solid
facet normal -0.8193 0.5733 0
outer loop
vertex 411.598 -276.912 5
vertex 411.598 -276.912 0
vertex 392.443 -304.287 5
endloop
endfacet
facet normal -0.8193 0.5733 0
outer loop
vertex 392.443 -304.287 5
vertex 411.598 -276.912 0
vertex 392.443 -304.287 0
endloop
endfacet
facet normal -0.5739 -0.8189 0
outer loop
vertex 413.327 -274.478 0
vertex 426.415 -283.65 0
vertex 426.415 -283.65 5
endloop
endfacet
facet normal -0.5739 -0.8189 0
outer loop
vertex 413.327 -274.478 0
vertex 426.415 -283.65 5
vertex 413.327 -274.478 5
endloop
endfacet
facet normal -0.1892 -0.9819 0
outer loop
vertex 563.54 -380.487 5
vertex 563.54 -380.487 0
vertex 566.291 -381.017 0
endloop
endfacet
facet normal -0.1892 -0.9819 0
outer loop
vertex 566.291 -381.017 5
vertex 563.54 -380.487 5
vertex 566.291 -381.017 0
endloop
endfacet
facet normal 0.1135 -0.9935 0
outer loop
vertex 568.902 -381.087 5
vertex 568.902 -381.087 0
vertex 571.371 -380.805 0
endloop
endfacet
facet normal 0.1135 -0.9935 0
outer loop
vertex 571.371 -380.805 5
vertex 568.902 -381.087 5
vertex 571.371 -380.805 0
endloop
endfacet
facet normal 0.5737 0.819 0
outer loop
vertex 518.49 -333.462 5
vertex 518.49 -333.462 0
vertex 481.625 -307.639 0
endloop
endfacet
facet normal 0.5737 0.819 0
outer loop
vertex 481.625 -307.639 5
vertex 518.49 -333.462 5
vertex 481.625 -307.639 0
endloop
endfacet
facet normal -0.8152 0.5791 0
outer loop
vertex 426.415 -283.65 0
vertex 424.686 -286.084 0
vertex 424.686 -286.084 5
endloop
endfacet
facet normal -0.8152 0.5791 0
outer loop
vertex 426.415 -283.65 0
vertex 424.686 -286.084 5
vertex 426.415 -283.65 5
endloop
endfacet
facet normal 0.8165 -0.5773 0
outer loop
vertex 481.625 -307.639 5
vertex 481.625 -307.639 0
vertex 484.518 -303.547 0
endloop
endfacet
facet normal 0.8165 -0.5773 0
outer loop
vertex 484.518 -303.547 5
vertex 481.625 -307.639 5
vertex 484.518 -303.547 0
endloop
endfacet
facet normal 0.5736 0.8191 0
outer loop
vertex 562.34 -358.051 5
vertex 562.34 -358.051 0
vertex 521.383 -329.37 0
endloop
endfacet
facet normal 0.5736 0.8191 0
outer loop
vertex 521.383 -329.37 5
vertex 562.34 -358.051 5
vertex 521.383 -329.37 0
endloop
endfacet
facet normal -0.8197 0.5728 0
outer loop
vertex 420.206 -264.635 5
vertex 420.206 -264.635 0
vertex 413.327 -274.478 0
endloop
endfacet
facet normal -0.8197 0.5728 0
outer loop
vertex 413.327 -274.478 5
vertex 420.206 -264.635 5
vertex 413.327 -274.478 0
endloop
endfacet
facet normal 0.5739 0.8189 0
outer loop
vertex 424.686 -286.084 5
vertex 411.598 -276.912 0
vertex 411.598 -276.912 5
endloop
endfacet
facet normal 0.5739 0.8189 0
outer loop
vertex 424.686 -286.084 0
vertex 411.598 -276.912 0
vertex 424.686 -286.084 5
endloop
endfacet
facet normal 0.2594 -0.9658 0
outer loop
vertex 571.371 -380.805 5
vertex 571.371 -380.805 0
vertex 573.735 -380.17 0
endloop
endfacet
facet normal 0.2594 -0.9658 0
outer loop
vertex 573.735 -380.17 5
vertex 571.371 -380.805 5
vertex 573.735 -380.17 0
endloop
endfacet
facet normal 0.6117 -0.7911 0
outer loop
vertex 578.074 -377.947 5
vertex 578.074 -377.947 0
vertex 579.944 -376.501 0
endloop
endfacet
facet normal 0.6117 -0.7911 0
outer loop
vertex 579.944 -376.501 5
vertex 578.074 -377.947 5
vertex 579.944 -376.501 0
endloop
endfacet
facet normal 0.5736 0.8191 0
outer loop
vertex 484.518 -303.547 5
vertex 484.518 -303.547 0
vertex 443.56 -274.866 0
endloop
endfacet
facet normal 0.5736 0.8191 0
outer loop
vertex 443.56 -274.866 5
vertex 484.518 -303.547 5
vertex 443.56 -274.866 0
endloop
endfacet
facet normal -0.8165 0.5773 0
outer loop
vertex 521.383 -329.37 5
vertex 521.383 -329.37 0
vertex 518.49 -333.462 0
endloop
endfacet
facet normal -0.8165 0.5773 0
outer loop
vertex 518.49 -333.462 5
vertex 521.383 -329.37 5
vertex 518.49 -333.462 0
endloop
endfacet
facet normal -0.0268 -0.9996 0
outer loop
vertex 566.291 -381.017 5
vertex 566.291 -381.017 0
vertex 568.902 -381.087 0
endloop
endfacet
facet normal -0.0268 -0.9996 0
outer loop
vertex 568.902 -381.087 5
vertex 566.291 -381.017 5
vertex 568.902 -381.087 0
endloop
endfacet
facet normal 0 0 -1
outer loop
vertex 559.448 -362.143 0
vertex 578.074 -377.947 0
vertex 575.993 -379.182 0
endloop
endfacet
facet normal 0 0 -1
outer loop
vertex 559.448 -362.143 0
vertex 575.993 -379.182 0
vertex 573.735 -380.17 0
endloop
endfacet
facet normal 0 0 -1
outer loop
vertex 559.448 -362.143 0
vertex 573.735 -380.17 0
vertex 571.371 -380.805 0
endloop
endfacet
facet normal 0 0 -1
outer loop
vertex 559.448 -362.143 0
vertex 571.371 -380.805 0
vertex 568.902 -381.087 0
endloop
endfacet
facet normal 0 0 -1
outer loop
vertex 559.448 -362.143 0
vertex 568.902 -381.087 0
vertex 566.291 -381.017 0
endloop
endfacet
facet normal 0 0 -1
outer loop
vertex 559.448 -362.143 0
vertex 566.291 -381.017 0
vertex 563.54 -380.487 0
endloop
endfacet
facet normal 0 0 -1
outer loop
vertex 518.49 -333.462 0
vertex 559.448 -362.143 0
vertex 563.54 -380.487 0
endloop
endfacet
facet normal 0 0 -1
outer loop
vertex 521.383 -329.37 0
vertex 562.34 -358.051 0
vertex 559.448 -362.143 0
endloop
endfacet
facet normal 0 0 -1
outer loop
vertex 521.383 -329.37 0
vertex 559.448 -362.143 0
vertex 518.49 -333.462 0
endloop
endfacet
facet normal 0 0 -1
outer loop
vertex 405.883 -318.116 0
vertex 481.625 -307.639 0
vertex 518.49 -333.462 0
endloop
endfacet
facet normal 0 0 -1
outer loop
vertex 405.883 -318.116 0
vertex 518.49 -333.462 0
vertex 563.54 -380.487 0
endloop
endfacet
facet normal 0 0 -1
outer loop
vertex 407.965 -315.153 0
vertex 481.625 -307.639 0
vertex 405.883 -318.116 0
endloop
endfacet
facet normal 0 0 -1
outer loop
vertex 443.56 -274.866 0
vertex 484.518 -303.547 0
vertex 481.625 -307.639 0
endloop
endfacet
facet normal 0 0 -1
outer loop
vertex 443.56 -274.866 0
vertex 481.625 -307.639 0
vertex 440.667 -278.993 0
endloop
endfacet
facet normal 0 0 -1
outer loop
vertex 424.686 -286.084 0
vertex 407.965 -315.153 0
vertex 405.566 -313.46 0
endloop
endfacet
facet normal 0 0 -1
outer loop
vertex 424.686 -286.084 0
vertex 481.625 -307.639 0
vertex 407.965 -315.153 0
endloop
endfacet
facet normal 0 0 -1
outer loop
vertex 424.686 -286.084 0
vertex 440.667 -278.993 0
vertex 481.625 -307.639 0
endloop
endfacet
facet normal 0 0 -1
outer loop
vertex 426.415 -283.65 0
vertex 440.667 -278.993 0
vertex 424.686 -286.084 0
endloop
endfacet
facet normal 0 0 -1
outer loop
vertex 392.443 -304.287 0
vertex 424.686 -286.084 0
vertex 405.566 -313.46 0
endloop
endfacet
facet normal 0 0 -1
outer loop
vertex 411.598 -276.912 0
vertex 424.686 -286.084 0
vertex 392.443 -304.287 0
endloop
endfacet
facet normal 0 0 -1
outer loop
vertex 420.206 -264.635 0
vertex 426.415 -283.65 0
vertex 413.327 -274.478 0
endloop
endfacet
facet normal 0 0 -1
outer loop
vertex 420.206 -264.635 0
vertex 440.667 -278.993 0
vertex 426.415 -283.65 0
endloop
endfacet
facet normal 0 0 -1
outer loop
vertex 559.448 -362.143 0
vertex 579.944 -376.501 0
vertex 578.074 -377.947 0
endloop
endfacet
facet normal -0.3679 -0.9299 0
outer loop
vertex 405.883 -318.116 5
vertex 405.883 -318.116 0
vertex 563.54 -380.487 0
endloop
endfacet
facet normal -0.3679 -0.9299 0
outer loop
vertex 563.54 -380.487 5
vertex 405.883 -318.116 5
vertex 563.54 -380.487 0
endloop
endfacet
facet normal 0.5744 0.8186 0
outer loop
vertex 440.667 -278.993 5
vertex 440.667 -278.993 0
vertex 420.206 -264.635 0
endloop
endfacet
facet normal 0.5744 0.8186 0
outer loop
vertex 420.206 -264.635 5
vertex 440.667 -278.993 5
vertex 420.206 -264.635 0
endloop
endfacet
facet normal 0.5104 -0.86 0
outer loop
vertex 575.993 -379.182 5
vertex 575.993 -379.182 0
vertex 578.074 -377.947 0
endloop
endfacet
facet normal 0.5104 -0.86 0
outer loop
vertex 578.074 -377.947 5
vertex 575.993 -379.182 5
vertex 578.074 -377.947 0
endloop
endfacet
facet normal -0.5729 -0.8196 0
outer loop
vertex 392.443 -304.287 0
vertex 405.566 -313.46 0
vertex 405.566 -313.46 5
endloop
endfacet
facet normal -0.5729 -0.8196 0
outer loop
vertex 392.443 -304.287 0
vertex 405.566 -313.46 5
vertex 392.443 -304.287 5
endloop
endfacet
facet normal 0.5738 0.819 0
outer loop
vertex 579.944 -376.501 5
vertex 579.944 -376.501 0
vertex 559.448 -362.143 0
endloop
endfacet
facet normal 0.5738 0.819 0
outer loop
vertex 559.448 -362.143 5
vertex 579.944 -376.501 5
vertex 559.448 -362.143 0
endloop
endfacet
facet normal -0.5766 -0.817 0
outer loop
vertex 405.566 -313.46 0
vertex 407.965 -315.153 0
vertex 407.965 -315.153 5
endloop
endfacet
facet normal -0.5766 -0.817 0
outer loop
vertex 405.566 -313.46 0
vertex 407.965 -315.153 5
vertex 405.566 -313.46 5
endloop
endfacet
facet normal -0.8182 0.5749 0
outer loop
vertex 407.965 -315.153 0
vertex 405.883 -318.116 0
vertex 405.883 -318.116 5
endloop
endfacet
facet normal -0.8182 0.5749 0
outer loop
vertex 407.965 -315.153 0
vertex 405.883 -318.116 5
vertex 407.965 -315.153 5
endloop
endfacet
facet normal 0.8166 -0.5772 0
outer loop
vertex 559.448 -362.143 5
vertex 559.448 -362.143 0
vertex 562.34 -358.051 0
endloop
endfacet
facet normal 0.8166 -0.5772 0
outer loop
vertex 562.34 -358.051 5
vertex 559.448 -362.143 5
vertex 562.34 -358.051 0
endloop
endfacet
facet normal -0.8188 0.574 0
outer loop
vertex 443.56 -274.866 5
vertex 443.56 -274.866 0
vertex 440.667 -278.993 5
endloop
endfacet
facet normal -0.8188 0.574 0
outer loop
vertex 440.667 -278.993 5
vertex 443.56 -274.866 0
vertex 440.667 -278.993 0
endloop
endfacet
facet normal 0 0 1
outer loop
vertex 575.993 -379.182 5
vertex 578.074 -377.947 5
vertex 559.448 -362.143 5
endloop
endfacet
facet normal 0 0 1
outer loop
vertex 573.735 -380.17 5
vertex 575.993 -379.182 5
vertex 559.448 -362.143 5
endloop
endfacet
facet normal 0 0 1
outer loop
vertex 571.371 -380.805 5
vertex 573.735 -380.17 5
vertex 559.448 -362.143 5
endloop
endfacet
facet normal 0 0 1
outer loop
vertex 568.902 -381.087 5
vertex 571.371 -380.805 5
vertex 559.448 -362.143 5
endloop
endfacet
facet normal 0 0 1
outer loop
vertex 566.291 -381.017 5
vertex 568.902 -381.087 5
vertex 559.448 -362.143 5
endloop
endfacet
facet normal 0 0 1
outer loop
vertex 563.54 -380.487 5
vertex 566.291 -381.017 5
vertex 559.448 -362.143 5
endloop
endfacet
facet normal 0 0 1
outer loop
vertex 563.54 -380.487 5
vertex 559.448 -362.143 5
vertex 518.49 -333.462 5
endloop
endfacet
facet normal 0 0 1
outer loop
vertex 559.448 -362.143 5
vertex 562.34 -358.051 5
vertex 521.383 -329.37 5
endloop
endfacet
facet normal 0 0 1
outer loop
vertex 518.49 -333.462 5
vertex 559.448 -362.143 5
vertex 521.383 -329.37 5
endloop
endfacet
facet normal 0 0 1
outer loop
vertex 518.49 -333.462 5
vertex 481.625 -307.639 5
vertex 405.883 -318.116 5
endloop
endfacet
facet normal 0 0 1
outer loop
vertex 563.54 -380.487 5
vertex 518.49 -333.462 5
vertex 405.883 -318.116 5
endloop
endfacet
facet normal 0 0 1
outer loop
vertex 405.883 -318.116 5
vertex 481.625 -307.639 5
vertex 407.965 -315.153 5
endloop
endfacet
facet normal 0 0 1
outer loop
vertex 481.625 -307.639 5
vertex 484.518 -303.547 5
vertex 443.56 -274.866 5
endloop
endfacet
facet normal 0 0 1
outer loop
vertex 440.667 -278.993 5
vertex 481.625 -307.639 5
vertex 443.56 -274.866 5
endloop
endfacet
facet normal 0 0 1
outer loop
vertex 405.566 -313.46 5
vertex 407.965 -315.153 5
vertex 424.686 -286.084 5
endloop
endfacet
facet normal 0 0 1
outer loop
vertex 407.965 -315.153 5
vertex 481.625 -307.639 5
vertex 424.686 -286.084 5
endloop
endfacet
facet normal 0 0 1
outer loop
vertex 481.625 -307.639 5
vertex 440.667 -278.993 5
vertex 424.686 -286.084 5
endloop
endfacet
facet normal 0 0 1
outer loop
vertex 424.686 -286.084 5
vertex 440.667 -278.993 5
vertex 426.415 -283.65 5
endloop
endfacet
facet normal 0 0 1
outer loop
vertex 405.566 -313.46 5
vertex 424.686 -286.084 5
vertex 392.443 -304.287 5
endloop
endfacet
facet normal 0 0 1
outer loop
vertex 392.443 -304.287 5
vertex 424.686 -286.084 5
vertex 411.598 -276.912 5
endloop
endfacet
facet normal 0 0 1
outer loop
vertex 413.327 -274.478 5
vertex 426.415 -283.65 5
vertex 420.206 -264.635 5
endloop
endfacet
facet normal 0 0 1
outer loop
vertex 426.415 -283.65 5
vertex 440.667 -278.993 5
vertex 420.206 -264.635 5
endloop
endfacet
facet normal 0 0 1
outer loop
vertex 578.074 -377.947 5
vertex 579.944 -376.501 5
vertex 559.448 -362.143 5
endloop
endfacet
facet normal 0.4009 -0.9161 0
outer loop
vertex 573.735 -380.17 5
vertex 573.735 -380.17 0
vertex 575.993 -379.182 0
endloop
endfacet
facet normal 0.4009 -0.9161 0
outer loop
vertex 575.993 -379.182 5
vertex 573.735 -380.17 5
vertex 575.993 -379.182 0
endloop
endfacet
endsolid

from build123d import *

# Parameters (mm, degrees)
PAD009_DEPTH = 5


with BuildPart() as part:
    # Sketch010 → Pad009 (new body)
    with BuildSketch(Plane.XY):
        with BuildLine():
            add(Edge.make_bspline(
                [(411.598433, -276.911825), (424.686488, -286.084047)],
                knots=[0, 0, 45.303532, 45.303532], degree=1))
            add(Edge.make_bspline(
                [(424.686488, -286.084047), (426.4151, -283.64988)],
                knots=[0, 0, 8.46286, 8.46286], degree=1))
            add(Edge.make_bspline(
                [(426.4151, -283.64988), (413.327044, -274.477658)],
                knots=[0, 0, 45.303532, 45.303532], degree=1))
            add(Edge.make_bspline(
                [(420.206211, -264.635159), (413.327044, -274.477658)],
                knots=[0, 0, 34.039095, 34.039095], degree=1))
            add(Edge.make_bspline(
                [(440.667321, -278.993214), (420.206211, -264.635159)],
                knots=[0, 0, 70.855416, 70.855416], degree=1))
            add(Edge.make_bspline(
                [(443.560099, -274.865714), (440.667321, -278.993214)],
                knots=[0, 0, 14.287407, 14.287407], degree=1))
            add(Edge.make_bspline(
                [(484.517598, -303.546547), (443.560099, -274.865714)],
                knots=[0, 0, 141.735317, 141.735317], degree=1))
            add(Edge.make_bspline(
                [(481.624821, -307.638769), (484.517598, -303.546547)],
                knots=[0, 0, 14.205633, 14.205633], degree=1))
            add(Edge.make_bspline(
                [(518.490097, -333.462102), (481.624821, -307.638769)],
                knots=[0, 0, 127.587186, 127.587186], degree=1))
            add(Edge.make_bspline(
                [(521.382875, -329.369879), (518.490097, -333.462102)],
                knots=[0, 0, 14.205633, 14.205633], degree=1))
            add(Edge.make_bspline(
                [(562.340374, -358.050712), (521.382875, -329.369879)],
                knots=[0, 0, 141.735317, 141.735317], degree=1))
            add(Edge.make_bspline(
                [(559.447597, -362.142934), (562.340374, -358.050712)],
                knots=[0, 0, 14.205633, 14.205633], degree=1))
            add(Edge.make_bspline(
                [(579.943985, -376.50099), (559.447597, -362.142934)],
                knots=[0, 0, 70.937296, 70.937296], degree=1))
            add(Edge.make_bspline(
                [(578.074263, -377.947378), (579.943985, -376.50099)],
                knots=[0, 0, 6.700746, 6.700746], degree=1))
            add(Edge.make_bspline(
                [(575.992874, -379.182101), (578.074263, -377.947378)],
                knots=[0, 0, 6.860029, 6.860029], degree=1))
            add(Edge.make_bspline(
                [(573.735096, -380.169878), (575.992874, -379.182101)],
                knots=[0, 0, 6.9857, 6.9857], degree=1))
            add(Edge.make_bspline(
                [(571.371485, -380.804878), (573.735096, -380.169878)],
                knots=[0, 0, 6.937579, 6.937579], degree=1))
            add(Edge.make_bspline(
                [(568.902041, -381.087101), (571.371485, -380.804878)],
                knots=[0, 0, 7.045566, 7.045566], degree=1))
            add(Edge.make_bspline(
                [(566.291485, -381.016545), (568.902041, -381.087101)],
                knots=[0, 0, 7.402702, 7.402702], degree=1))
            add(Edge.make_bspline(
                [(563.539819, -380.487378), (566.291485, -381.016545)],
                knots=[0, 0, 7.942921, 7.942921], degree=1))
            add(Edge.make_bspline(
                [(405.883433, -318.116269), (563.539819, -380.487378)],
                knots=[0, 0, 480.60155, 480.60155], degree=1))
            add(Edge.make_bspline(
                [(405.883433, -318.116269), (407.964822, -315.152935)],
                knots=[0, 0, 10.264989, 10.264989], degree=1))
            add(Edge.make_bspline(
                [(407.964822, -315.152935), (405.565933, -313.459602)],
                knots=[0, 0, 8.323461, 8.323461], degree=1))
            add(Edge.make_bspline(
                [(405.565933, -313.459602), (392.4426, -304.28738)],
                knots=[0, 0, 45.38546, 45.38546], degree=1))
            add(Edge.make_bspline(
                [(411.598433, -276.911825), (392.4426, -304.28738)],
                knots=[0, 0, 94.711404, 94.711404], degree=1))
        make_face()
    extrude(amount=PAD009_DEPTH)


solid = part.part
